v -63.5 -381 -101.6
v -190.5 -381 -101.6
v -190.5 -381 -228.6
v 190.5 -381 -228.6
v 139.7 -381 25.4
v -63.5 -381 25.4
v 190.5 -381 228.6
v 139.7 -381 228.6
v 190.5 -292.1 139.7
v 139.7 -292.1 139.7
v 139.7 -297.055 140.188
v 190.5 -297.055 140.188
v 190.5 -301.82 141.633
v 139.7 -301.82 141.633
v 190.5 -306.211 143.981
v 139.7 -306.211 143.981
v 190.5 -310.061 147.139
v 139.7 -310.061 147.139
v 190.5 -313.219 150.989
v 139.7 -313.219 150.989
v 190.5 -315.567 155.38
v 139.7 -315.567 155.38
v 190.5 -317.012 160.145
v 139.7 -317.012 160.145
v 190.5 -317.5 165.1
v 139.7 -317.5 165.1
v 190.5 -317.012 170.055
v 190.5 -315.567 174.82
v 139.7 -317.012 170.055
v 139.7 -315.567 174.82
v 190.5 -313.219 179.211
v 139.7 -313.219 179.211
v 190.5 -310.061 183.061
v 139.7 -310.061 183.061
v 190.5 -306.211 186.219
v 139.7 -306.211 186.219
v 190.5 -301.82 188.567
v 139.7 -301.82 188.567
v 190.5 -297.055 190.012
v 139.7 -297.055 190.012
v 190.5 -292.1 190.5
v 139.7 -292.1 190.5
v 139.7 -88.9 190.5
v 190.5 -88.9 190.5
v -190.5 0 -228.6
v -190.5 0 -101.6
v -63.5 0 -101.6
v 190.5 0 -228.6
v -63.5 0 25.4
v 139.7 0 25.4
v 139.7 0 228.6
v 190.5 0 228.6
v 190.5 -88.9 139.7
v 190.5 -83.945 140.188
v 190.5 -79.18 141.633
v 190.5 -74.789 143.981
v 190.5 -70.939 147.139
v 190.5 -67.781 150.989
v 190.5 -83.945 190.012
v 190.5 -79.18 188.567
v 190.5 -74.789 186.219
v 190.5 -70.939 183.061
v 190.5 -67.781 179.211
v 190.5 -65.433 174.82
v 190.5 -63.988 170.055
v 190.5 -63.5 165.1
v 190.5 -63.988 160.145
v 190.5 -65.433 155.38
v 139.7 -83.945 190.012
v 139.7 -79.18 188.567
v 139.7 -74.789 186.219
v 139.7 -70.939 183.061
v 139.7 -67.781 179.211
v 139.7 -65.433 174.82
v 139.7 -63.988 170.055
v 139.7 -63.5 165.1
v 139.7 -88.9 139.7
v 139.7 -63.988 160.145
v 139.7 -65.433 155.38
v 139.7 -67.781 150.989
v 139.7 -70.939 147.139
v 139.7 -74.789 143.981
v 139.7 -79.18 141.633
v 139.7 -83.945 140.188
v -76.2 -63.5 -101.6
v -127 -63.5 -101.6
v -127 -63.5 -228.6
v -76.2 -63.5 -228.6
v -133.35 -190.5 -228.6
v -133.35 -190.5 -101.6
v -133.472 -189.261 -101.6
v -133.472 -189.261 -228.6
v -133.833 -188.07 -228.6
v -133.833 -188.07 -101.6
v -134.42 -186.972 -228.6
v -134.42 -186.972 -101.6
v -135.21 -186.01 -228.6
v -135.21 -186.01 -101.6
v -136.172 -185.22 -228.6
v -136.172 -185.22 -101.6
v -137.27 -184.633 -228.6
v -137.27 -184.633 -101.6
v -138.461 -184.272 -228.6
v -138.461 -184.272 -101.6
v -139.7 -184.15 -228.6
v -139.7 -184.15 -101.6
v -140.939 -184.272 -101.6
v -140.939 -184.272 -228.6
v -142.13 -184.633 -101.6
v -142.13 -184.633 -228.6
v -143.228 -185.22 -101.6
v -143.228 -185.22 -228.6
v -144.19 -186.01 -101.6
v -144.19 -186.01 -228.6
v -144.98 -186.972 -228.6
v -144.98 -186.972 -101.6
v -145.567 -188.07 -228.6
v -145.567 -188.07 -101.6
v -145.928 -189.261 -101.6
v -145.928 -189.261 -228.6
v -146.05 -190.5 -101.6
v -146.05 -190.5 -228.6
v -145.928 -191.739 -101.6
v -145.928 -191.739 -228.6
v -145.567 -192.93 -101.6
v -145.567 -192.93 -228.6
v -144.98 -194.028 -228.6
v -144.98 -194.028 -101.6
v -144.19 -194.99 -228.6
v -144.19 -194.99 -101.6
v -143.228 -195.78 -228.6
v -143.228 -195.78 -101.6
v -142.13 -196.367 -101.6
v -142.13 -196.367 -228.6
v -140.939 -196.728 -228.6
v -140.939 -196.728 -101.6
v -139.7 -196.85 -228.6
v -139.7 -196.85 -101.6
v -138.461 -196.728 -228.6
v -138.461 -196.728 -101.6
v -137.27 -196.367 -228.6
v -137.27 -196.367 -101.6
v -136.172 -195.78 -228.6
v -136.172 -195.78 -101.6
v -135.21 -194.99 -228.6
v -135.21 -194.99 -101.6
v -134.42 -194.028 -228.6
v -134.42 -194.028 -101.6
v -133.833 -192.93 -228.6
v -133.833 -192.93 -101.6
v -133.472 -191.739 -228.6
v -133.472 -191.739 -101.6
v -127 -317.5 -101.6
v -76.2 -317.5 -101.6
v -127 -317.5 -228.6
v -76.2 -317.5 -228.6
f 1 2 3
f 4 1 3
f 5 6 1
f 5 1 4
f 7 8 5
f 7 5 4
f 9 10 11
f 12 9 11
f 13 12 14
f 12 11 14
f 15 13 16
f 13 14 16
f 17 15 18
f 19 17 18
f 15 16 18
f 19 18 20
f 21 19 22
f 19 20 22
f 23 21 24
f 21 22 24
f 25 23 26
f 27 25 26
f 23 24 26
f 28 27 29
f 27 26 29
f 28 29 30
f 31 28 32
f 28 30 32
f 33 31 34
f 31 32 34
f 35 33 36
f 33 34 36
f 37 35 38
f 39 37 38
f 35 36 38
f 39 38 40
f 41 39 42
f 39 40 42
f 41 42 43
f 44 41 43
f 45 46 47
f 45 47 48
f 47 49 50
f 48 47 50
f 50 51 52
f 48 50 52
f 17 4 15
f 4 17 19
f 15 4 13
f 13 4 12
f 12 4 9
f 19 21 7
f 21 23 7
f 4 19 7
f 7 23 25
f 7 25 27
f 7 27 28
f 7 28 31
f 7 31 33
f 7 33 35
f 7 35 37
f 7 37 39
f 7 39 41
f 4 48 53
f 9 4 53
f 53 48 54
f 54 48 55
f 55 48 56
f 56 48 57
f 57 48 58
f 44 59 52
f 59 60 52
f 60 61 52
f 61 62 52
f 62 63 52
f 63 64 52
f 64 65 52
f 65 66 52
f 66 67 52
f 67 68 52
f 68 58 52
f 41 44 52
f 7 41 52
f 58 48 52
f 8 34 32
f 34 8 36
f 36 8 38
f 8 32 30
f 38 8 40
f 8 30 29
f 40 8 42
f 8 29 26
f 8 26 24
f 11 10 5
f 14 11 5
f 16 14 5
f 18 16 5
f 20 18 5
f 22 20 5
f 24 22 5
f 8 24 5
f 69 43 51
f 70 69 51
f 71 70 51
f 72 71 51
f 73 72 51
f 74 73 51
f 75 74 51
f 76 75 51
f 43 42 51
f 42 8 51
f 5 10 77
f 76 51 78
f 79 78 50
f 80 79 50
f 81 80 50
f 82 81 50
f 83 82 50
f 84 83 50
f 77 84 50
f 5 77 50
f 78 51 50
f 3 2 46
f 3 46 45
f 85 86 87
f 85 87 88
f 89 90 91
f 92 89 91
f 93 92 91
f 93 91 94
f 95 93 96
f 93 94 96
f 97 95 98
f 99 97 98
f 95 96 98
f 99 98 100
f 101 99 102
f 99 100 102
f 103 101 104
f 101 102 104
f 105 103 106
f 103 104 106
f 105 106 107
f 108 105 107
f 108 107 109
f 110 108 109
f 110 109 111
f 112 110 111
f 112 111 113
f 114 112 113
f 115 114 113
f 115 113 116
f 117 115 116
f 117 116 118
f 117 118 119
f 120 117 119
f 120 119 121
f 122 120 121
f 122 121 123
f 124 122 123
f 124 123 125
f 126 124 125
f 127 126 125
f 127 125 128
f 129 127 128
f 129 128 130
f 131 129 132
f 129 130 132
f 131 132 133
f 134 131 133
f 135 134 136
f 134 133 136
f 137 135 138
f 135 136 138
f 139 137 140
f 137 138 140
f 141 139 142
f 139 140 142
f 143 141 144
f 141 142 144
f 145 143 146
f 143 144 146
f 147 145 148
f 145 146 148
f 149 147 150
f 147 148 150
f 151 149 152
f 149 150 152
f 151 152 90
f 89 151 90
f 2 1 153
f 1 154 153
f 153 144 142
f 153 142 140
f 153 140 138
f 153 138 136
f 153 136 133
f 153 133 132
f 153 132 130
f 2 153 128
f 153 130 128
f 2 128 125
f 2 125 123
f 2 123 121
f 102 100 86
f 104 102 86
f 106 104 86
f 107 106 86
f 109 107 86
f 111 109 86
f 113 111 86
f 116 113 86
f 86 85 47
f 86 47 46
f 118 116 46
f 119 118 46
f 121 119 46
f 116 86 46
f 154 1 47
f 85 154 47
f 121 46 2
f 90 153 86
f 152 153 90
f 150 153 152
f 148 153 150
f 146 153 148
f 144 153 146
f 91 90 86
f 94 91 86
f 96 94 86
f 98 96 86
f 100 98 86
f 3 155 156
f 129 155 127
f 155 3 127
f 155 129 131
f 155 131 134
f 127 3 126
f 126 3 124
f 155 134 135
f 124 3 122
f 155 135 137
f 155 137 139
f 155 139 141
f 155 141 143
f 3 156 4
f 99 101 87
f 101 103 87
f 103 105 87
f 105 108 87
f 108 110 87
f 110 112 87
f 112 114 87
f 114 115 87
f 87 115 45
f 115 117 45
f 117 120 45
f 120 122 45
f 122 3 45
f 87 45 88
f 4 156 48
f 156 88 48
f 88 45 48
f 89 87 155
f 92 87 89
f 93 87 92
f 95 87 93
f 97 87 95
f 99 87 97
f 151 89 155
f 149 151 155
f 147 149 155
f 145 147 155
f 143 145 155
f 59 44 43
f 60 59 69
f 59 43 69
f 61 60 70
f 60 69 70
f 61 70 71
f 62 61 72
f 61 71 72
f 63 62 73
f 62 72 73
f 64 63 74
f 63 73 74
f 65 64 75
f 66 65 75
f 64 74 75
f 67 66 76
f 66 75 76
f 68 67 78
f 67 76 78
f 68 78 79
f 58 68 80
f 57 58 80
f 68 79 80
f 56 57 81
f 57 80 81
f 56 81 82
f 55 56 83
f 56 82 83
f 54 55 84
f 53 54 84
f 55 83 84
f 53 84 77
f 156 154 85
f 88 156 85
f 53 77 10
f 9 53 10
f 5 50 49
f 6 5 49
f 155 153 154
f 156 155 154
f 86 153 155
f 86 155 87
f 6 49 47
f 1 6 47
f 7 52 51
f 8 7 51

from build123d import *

# Parameters (mm, degrees)
F1_DEPTH = 381
F2_R     = 6.35
F3_DEPTH = 127.001
F4_W     = 50.8
F4_H     = 254
F5_DEPTH = 127.001
F7_DEPTH = 63.5


with BuildPart() as f1:
    # F0 (on Front) → F1 (new body)
    with BuildSketch(Plane.XZ):
        Polygon((190.5, -228.6), (190.5, 228.6), (139.7, 228.6), (139.7, 25.4), (-63.5, 25.4), (-63.5, -101.6), (-190.5, -101.6), (-190.5, -228.6), align=None)
    extrude(amount=F1_DEPTH)

    # F2 (on face) → F3 (cut, through all)
    with BuildSketch(Plane.XY.offset(-101.6)):
        with Locations((-139.7, -190.5)):
            Circle(F2_R)
    extrude(amount=-F3_DEPTH, mode=Mode.SUBTRACT)

    # F4 (on face) → F5 (cut, through all)
    with BuildSketch(Plane.XY.offset(-101.6)):
        with Locations((-101.6, -190.5)):
            Rectangle(F4_W, F4_H)
    extrude(amount=-F5_DEPTH, mode=Mode.SUBTRACT)

    # F6 (on face) → F7 (cut)
    with BuildSketch(Plane(origin=(139.7, 0, 0), x_dir=(0, -1, 0), z_dir=(-1, 0, 0))):
        with BuildLine():
            Line((88.9, 139.7), (292.1, 139.7))
            ThreePointArc((292.1, 139.7), (317.5, 165.1), (292.1, 190.5))
            Line((292.1, 190.5), (88.9, 190.5))
            ThreePointArc((88.9, 190.5), (63.5, 165.1), (88.9, 139.7))
        make_face()
    extrude(amount=-F7_DEPTH, mode=Mode.SUBTRACT)


solid = f1.part
